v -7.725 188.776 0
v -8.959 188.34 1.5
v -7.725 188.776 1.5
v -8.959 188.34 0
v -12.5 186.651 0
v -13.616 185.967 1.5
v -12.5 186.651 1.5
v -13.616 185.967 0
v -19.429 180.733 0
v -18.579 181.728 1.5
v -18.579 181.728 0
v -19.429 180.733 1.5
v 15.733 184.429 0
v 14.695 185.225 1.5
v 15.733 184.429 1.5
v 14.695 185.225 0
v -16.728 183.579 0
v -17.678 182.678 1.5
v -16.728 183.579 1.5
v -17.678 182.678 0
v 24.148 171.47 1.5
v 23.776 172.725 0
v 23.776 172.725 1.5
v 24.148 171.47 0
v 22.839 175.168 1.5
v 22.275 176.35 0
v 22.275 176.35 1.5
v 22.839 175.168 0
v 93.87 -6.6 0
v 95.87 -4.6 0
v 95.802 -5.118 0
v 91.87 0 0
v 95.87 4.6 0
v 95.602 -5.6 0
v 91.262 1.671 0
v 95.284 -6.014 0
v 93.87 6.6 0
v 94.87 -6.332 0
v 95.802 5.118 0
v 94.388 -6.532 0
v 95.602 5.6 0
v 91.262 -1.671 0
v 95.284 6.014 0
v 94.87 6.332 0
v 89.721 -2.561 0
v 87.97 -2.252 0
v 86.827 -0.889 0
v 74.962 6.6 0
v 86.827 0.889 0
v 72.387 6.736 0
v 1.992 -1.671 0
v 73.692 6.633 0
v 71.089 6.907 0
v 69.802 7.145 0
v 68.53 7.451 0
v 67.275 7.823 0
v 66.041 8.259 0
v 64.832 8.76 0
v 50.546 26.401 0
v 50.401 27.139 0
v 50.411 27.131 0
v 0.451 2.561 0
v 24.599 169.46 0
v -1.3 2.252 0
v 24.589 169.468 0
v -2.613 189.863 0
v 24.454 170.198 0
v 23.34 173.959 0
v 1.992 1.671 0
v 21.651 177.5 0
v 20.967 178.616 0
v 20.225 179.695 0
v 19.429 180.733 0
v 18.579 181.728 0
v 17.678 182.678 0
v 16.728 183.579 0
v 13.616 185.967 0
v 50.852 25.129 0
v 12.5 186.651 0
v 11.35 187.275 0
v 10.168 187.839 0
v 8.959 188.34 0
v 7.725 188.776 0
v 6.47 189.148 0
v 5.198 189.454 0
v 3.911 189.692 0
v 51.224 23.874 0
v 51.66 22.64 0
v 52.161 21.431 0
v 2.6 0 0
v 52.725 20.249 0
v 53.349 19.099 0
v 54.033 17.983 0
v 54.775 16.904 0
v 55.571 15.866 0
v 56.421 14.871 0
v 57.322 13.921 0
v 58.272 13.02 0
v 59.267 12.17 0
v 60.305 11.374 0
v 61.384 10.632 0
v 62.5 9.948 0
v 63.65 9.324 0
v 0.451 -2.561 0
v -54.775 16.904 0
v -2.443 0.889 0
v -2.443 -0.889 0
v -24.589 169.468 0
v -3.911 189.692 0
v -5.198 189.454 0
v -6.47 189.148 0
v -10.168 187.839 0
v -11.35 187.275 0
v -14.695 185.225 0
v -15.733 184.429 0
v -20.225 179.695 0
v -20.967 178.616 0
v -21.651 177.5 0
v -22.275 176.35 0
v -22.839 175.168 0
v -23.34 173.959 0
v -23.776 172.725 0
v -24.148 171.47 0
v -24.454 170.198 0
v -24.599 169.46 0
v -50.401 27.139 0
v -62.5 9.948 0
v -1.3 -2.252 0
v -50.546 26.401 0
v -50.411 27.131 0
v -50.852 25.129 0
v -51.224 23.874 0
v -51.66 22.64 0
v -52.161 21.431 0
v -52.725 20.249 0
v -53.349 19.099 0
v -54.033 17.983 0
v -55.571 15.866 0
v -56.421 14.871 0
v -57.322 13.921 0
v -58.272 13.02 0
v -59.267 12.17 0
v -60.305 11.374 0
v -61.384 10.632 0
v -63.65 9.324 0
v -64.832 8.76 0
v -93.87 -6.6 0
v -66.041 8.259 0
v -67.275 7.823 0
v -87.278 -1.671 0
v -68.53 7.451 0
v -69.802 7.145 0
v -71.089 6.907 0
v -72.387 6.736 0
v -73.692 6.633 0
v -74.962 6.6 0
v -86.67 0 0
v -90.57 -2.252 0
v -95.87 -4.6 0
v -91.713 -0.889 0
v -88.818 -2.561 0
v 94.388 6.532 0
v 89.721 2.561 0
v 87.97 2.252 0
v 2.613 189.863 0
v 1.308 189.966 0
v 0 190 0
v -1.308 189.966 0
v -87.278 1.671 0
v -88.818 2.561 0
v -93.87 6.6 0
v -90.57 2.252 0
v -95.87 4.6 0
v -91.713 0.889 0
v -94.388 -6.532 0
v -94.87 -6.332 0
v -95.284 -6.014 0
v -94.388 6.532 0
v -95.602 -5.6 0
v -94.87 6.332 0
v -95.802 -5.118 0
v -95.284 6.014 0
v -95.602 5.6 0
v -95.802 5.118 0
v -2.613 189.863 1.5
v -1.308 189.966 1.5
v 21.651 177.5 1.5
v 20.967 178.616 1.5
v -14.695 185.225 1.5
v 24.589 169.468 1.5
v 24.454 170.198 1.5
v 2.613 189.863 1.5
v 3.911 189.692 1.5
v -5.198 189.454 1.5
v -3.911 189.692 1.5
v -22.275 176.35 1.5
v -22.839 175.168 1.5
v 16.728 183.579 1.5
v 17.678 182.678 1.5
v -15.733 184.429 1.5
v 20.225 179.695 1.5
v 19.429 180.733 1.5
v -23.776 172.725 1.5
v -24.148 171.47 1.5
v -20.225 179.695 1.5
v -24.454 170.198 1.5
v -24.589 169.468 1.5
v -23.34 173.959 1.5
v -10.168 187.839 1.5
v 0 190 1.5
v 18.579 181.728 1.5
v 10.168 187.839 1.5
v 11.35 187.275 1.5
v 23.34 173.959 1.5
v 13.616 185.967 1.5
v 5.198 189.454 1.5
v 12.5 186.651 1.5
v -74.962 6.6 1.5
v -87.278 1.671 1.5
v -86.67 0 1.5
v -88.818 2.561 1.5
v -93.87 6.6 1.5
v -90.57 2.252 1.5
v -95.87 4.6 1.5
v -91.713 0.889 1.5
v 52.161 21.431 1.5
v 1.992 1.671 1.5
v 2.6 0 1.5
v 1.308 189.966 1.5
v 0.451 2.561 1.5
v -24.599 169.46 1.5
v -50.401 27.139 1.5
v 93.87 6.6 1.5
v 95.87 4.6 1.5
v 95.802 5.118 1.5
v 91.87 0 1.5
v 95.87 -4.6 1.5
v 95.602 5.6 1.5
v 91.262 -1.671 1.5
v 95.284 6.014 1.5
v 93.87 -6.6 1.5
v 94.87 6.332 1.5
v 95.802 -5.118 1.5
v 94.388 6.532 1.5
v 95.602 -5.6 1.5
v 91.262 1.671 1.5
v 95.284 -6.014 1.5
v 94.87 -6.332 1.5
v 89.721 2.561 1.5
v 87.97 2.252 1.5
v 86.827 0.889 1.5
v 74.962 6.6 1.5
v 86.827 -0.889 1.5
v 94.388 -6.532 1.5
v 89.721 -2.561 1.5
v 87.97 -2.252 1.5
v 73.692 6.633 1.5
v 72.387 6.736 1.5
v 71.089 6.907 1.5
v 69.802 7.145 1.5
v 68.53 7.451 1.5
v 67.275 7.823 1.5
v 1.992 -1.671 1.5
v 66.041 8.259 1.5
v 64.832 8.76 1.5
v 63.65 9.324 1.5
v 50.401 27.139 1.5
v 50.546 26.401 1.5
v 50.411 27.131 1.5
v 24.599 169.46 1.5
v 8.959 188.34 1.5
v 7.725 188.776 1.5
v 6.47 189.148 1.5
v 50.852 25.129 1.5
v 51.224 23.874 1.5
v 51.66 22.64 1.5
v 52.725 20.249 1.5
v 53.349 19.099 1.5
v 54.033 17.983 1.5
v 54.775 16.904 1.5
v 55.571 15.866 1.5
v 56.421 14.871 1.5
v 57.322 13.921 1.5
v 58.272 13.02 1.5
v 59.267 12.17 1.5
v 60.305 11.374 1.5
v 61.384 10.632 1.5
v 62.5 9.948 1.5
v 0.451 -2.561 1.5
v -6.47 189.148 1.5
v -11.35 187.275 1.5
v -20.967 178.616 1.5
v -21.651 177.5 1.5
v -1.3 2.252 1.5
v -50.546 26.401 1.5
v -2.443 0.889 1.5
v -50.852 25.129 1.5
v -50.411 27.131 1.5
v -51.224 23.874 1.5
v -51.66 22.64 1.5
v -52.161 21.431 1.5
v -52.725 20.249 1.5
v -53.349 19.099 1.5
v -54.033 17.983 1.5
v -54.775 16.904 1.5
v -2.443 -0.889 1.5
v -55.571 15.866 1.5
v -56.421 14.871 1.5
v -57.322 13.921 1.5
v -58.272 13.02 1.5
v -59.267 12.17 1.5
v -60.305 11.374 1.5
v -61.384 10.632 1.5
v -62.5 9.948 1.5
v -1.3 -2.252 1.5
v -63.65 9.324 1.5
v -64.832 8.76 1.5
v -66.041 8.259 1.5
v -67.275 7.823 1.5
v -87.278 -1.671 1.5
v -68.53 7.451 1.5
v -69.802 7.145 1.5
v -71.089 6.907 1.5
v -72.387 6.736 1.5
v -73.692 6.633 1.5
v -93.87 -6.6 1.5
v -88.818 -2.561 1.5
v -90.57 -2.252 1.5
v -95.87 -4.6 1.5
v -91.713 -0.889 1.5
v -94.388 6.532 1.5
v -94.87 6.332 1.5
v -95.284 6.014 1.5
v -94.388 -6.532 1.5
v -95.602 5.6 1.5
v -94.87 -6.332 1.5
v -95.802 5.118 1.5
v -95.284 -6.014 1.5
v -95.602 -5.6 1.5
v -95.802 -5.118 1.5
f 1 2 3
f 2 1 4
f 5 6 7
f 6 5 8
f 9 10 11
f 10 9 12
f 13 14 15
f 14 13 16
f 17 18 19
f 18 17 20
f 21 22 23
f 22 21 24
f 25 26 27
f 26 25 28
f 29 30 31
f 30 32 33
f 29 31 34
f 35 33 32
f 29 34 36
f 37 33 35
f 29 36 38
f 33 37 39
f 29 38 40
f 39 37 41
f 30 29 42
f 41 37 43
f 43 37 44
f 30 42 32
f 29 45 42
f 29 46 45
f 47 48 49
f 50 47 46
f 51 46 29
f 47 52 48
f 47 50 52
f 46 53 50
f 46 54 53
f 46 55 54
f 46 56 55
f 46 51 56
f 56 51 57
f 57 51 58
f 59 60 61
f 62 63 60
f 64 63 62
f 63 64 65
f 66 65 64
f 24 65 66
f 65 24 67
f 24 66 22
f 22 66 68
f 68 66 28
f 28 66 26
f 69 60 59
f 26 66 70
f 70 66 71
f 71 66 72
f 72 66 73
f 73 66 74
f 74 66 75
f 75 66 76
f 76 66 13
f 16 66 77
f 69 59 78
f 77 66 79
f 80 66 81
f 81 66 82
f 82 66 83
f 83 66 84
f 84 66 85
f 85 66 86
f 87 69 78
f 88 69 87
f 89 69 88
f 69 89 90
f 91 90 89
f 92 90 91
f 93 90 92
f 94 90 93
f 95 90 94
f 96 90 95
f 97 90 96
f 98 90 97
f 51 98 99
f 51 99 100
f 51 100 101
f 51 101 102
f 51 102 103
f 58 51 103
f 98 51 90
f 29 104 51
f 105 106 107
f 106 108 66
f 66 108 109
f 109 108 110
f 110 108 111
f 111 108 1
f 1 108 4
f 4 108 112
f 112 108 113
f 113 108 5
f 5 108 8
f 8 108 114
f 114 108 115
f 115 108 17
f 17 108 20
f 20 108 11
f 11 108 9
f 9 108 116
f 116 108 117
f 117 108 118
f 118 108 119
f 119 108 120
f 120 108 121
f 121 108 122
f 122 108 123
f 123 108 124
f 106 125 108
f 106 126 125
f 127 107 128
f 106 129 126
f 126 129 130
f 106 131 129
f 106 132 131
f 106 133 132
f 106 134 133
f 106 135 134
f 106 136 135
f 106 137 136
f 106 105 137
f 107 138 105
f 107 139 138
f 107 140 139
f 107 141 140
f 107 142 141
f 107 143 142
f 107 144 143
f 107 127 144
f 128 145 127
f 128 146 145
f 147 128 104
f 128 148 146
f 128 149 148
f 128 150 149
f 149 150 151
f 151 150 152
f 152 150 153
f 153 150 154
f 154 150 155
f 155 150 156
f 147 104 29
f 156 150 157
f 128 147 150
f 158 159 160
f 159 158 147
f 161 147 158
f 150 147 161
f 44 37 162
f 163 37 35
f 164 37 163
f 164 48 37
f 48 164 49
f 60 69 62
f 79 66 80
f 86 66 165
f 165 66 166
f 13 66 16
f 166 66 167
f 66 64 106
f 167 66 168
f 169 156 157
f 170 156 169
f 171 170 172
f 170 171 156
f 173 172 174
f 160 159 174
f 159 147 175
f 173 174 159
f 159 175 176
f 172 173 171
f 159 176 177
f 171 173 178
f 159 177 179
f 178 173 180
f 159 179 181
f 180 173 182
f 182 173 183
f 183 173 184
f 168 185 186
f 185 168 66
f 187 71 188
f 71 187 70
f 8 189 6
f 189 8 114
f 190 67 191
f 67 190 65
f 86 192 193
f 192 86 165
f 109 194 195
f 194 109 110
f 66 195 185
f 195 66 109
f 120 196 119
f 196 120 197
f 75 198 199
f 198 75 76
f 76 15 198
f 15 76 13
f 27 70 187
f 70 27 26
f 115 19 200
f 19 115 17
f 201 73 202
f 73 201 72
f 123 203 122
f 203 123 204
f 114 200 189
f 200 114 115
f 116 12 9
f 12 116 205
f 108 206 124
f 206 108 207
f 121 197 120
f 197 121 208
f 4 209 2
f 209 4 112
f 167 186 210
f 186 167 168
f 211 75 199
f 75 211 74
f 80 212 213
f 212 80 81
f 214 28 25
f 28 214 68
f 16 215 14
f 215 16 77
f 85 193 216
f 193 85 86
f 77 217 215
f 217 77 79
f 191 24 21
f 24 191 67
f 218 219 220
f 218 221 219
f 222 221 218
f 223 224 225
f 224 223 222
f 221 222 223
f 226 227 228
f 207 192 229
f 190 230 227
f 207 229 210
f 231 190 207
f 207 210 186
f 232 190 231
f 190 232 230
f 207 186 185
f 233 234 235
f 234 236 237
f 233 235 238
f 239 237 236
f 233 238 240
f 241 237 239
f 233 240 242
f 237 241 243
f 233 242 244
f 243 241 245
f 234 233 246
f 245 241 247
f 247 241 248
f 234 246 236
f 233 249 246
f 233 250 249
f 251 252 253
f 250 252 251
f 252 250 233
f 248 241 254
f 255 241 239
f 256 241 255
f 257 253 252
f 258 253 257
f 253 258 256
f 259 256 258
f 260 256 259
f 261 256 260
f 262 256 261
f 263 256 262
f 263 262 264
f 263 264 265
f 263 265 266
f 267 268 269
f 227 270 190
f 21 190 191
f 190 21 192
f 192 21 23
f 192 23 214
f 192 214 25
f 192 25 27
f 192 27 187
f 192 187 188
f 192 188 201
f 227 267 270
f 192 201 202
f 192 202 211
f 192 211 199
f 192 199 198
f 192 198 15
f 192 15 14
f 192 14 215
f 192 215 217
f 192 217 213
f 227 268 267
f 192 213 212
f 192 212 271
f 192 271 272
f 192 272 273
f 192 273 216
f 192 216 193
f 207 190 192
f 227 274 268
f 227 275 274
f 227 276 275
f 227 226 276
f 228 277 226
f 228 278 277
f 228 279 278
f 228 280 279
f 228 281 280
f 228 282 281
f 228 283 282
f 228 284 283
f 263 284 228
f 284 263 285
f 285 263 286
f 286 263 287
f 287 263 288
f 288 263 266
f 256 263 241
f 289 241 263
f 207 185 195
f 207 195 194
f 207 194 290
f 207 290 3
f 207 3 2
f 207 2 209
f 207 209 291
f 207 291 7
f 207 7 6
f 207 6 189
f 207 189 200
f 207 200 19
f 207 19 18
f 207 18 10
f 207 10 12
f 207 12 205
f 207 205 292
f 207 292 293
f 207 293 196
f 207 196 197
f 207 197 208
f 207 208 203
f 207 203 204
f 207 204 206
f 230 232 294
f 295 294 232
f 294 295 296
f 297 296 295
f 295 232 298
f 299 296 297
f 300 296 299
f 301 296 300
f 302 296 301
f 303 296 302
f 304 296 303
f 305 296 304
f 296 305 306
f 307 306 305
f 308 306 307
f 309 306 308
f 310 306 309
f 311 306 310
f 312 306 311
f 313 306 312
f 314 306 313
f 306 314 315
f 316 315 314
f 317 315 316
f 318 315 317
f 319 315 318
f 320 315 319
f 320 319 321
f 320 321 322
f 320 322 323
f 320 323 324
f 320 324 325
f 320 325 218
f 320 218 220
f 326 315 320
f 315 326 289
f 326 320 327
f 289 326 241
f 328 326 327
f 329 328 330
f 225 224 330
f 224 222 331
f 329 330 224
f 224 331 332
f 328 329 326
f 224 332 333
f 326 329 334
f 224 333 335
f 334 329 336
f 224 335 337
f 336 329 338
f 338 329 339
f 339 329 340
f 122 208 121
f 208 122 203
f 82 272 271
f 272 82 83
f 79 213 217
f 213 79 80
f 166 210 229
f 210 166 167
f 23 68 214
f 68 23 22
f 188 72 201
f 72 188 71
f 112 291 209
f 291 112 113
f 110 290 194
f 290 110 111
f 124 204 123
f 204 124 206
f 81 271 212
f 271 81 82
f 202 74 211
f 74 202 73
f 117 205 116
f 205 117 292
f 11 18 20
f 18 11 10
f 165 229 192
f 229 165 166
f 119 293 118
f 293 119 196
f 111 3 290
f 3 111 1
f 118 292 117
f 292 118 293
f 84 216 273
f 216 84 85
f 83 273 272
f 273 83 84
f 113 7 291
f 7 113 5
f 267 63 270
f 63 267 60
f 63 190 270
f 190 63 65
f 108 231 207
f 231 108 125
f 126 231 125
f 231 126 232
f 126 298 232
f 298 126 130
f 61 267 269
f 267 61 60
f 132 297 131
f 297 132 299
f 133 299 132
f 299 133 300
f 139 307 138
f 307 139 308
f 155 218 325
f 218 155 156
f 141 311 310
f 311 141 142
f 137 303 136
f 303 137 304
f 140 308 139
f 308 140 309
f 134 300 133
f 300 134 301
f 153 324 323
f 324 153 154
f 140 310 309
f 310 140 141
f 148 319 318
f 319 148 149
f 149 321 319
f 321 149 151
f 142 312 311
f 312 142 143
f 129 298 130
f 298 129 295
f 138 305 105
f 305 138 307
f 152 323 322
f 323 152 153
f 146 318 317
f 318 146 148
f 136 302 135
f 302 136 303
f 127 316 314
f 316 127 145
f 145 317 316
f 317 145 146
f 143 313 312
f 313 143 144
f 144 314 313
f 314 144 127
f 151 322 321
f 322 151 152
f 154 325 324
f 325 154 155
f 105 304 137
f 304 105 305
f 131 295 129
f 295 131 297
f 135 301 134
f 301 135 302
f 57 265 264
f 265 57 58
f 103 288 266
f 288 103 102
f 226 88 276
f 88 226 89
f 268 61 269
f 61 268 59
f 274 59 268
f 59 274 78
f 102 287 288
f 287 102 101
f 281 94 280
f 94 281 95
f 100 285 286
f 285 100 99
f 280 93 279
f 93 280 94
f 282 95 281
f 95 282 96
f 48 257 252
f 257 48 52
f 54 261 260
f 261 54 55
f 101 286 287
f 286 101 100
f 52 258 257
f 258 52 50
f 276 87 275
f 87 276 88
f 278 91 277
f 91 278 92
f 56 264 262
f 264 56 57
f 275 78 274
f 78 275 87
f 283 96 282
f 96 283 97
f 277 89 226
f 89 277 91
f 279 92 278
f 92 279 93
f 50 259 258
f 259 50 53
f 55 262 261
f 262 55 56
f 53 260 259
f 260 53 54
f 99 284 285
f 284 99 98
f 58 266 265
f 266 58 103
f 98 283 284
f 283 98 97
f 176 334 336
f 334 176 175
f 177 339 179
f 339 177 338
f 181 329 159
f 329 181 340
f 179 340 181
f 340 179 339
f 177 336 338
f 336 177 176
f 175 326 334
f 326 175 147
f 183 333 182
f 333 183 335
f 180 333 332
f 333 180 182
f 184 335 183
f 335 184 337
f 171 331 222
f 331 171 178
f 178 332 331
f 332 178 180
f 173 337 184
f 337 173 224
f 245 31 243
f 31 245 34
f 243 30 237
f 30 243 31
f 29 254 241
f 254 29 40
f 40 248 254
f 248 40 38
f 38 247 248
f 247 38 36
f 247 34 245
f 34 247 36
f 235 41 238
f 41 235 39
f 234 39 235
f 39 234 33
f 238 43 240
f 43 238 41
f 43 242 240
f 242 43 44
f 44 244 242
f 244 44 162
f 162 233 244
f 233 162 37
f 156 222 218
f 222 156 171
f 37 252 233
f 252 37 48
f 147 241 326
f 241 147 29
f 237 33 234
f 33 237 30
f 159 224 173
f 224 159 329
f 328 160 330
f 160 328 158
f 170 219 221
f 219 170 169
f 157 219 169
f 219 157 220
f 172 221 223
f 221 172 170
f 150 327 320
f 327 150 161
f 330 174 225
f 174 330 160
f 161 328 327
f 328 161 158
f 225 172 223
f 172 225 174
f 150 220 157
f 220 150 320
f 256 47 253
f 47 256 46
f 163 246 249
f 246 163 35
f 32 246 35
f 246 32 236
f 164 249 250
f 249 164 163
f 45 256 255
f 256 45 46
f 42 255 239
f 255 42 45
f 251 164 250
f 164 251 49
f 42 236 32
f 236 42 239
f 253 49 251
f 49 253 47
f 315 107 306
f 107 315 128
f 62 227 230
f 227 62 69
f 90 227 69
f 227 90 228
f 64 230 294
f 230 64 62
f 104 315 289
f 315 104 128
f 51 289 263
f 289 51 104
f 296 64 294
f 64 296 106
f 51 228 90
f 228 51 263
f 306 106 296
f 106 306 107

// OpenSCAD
// Customizable mud guard (for bikes)
// by Stellar Innovation
// http://www.thingiverse.com/stellarinnovation/about
// licensed under the Creative Commons - Attribution license. 
//
// Remix of Fender mud guard for mtb 
// https://www.thingiverse.com/thing:1235562
// by stefano22
// https://www.thingiverse.com/stefano22/about
// licensed under the Creative Commons - Attribution license. 
//
// First revision 24 September 2017
// Second rev.  26 September 2017, corrected tangent-point computation

mudguard_length = 190; // [150:500]
mudguard_diameter = 50;    // [30:100]
mudguard_thickness = 1.5;   // [0.5:0.1:2.0]
mounting_hole_distance = 75; // [50:100]
drill_diameter = 5.2;          // [3.0:0.1:7.0]

MudGuard();

module MudGuard() {
  eps = 0.001;
  corner_radius = 2;
  extra_width = 4;           // "margin", distance from holes to edge
  mount_depth = drill_diameter + 2*extra_width;
  r = mudguard_diameter/2;
  
  // distance along curved shell from center to mounting hole
  hole_x = r*PI/2 + mounting_hole_distance - r;
  mount_width = 2*hole_x + drill_diameter + 2*extra_width;
    
  difference() {
    union() {
      // The actual mud guard
      translate([0, mount_depth/2 - eps])
        MainMudGuard(length = mudguard_length - mount_depth/2 + eps,
                        max_width = 2*hole_x);
      // The piece that attaches to the bike
      RoundBox(mount_width, mount_depth, mudguard_thickness, corner_radius, $fn=24);
    }
    MountingHoles(hole_x);
  }
}


// The actual mud guard
module MainMudGuard(length, max_width) {
  // Constructed from circles of radius r, 
  // with a center-to-center distance of (dist_x, dist_y)
  // Circles are used for the round ending and the fillets
  r = min(mudguard_diameter, max_width)/2;
  dist_x = min(3*r, max_width);
  dist_y = length - 2*r;
  dist = sqrt(dist_x*dist_x + dist_y*dist_y);
  
  // Compute the tangent points
  beta = atan2(dist_y, dist_x);
  gamma = acos(2*r/dist);
  alpha = gamma - beta;
  dx = r*cos(alpha);
  dy = r*sin(alpha);
  
  difference() {
    union() {
      linear_extrude(height=mudguard_thickness)
        polygon([[0, length], // end of mudguard
                 [dx, length - r + dy], // tangent point of first circle
                 [dist_x - dx, r - dy], // tangent point of second circle
                 [dist_x, 0], // base of mud guard
                 [-dist_x, 0], // and so on... (symmetric)
                 [-dist_x + dx, r - dy],
                 [-dx, length - r + dy]]);
      // Circular end
      translate([0, dist_y + r])
        difference() {
          cylinder(r=r, h=mudguard_thickness, $fn=120);
          // remove the part beyond the tangent point
          translate([-r, -r])
            cube([2*r, r+dy, mudguard_thickness]);
        }
    }
    
    // Fillets
    for (x=[-1, +1])
      translate([x*dist_x, r])
        difference() {
          cylinder(r=r, h=mudguard_thickness, $fn=120);
          // remove the part beyond the tangent point
          translate([-r, -dy])
              cube([2*r, r+dy, mudguard_thickness]);
        }
  }
}

// The piece with that attaches to the bike
module Mount() {
  r = mudguard_diameter/2; 
  hole_x = PI*r/2 + mounting_hole_distance - r;
  extra_width = 4;           // "margin", distance from holes to edge
  width = 2*(hole_x + drill_diameter/2 + extra_width);
  min_depth = 0; //25.4;
  depth = max(drill_diameter+2*extra_width, min_depth);
  corner_radius = 2;
  
  difference() {
    union() {
      RoundBox(width, depth, mudguard_thickness, corner_radius);
      translate([-7.5, 0]) {
        cube([15, 17, mudguard_thickness]);
        translate([0, 15])
          cube([15, 2, 15+mudguard_thickness]);
        translate([0, 13])
          cube([15, 4, 4]);
      }
    }
    MountingHoles(hole_x);
  }
}

module MountingHoles(hole_x) {
  // center
  cylinder(d=drill_diameter, h=mudguard_thickness);
  
  // sides
  for (x=[-1, +1])
    translate([x*hole_x, 0])
      cylinder(d=drill_diameter, h=mudguard_thickness);
}

// Box with rounded corners (in the xy-plane)
module RoundBox(w, d, h, r) {
  // rounded corners
  for (x=[-0.5, +0.5], y=[-0.5,+0.5])
    translate([x*(w - 2*r), y*(d - 2*r)])
      cylinder(r=r, h=h);
  // fill in the hull
  translate([-w/2 + r, -d/2])
    cube([w - 2*r, d, h]);
  translate([-w/2, -d/2 + r])
    cube([w, d - 2*r, h]);
}
